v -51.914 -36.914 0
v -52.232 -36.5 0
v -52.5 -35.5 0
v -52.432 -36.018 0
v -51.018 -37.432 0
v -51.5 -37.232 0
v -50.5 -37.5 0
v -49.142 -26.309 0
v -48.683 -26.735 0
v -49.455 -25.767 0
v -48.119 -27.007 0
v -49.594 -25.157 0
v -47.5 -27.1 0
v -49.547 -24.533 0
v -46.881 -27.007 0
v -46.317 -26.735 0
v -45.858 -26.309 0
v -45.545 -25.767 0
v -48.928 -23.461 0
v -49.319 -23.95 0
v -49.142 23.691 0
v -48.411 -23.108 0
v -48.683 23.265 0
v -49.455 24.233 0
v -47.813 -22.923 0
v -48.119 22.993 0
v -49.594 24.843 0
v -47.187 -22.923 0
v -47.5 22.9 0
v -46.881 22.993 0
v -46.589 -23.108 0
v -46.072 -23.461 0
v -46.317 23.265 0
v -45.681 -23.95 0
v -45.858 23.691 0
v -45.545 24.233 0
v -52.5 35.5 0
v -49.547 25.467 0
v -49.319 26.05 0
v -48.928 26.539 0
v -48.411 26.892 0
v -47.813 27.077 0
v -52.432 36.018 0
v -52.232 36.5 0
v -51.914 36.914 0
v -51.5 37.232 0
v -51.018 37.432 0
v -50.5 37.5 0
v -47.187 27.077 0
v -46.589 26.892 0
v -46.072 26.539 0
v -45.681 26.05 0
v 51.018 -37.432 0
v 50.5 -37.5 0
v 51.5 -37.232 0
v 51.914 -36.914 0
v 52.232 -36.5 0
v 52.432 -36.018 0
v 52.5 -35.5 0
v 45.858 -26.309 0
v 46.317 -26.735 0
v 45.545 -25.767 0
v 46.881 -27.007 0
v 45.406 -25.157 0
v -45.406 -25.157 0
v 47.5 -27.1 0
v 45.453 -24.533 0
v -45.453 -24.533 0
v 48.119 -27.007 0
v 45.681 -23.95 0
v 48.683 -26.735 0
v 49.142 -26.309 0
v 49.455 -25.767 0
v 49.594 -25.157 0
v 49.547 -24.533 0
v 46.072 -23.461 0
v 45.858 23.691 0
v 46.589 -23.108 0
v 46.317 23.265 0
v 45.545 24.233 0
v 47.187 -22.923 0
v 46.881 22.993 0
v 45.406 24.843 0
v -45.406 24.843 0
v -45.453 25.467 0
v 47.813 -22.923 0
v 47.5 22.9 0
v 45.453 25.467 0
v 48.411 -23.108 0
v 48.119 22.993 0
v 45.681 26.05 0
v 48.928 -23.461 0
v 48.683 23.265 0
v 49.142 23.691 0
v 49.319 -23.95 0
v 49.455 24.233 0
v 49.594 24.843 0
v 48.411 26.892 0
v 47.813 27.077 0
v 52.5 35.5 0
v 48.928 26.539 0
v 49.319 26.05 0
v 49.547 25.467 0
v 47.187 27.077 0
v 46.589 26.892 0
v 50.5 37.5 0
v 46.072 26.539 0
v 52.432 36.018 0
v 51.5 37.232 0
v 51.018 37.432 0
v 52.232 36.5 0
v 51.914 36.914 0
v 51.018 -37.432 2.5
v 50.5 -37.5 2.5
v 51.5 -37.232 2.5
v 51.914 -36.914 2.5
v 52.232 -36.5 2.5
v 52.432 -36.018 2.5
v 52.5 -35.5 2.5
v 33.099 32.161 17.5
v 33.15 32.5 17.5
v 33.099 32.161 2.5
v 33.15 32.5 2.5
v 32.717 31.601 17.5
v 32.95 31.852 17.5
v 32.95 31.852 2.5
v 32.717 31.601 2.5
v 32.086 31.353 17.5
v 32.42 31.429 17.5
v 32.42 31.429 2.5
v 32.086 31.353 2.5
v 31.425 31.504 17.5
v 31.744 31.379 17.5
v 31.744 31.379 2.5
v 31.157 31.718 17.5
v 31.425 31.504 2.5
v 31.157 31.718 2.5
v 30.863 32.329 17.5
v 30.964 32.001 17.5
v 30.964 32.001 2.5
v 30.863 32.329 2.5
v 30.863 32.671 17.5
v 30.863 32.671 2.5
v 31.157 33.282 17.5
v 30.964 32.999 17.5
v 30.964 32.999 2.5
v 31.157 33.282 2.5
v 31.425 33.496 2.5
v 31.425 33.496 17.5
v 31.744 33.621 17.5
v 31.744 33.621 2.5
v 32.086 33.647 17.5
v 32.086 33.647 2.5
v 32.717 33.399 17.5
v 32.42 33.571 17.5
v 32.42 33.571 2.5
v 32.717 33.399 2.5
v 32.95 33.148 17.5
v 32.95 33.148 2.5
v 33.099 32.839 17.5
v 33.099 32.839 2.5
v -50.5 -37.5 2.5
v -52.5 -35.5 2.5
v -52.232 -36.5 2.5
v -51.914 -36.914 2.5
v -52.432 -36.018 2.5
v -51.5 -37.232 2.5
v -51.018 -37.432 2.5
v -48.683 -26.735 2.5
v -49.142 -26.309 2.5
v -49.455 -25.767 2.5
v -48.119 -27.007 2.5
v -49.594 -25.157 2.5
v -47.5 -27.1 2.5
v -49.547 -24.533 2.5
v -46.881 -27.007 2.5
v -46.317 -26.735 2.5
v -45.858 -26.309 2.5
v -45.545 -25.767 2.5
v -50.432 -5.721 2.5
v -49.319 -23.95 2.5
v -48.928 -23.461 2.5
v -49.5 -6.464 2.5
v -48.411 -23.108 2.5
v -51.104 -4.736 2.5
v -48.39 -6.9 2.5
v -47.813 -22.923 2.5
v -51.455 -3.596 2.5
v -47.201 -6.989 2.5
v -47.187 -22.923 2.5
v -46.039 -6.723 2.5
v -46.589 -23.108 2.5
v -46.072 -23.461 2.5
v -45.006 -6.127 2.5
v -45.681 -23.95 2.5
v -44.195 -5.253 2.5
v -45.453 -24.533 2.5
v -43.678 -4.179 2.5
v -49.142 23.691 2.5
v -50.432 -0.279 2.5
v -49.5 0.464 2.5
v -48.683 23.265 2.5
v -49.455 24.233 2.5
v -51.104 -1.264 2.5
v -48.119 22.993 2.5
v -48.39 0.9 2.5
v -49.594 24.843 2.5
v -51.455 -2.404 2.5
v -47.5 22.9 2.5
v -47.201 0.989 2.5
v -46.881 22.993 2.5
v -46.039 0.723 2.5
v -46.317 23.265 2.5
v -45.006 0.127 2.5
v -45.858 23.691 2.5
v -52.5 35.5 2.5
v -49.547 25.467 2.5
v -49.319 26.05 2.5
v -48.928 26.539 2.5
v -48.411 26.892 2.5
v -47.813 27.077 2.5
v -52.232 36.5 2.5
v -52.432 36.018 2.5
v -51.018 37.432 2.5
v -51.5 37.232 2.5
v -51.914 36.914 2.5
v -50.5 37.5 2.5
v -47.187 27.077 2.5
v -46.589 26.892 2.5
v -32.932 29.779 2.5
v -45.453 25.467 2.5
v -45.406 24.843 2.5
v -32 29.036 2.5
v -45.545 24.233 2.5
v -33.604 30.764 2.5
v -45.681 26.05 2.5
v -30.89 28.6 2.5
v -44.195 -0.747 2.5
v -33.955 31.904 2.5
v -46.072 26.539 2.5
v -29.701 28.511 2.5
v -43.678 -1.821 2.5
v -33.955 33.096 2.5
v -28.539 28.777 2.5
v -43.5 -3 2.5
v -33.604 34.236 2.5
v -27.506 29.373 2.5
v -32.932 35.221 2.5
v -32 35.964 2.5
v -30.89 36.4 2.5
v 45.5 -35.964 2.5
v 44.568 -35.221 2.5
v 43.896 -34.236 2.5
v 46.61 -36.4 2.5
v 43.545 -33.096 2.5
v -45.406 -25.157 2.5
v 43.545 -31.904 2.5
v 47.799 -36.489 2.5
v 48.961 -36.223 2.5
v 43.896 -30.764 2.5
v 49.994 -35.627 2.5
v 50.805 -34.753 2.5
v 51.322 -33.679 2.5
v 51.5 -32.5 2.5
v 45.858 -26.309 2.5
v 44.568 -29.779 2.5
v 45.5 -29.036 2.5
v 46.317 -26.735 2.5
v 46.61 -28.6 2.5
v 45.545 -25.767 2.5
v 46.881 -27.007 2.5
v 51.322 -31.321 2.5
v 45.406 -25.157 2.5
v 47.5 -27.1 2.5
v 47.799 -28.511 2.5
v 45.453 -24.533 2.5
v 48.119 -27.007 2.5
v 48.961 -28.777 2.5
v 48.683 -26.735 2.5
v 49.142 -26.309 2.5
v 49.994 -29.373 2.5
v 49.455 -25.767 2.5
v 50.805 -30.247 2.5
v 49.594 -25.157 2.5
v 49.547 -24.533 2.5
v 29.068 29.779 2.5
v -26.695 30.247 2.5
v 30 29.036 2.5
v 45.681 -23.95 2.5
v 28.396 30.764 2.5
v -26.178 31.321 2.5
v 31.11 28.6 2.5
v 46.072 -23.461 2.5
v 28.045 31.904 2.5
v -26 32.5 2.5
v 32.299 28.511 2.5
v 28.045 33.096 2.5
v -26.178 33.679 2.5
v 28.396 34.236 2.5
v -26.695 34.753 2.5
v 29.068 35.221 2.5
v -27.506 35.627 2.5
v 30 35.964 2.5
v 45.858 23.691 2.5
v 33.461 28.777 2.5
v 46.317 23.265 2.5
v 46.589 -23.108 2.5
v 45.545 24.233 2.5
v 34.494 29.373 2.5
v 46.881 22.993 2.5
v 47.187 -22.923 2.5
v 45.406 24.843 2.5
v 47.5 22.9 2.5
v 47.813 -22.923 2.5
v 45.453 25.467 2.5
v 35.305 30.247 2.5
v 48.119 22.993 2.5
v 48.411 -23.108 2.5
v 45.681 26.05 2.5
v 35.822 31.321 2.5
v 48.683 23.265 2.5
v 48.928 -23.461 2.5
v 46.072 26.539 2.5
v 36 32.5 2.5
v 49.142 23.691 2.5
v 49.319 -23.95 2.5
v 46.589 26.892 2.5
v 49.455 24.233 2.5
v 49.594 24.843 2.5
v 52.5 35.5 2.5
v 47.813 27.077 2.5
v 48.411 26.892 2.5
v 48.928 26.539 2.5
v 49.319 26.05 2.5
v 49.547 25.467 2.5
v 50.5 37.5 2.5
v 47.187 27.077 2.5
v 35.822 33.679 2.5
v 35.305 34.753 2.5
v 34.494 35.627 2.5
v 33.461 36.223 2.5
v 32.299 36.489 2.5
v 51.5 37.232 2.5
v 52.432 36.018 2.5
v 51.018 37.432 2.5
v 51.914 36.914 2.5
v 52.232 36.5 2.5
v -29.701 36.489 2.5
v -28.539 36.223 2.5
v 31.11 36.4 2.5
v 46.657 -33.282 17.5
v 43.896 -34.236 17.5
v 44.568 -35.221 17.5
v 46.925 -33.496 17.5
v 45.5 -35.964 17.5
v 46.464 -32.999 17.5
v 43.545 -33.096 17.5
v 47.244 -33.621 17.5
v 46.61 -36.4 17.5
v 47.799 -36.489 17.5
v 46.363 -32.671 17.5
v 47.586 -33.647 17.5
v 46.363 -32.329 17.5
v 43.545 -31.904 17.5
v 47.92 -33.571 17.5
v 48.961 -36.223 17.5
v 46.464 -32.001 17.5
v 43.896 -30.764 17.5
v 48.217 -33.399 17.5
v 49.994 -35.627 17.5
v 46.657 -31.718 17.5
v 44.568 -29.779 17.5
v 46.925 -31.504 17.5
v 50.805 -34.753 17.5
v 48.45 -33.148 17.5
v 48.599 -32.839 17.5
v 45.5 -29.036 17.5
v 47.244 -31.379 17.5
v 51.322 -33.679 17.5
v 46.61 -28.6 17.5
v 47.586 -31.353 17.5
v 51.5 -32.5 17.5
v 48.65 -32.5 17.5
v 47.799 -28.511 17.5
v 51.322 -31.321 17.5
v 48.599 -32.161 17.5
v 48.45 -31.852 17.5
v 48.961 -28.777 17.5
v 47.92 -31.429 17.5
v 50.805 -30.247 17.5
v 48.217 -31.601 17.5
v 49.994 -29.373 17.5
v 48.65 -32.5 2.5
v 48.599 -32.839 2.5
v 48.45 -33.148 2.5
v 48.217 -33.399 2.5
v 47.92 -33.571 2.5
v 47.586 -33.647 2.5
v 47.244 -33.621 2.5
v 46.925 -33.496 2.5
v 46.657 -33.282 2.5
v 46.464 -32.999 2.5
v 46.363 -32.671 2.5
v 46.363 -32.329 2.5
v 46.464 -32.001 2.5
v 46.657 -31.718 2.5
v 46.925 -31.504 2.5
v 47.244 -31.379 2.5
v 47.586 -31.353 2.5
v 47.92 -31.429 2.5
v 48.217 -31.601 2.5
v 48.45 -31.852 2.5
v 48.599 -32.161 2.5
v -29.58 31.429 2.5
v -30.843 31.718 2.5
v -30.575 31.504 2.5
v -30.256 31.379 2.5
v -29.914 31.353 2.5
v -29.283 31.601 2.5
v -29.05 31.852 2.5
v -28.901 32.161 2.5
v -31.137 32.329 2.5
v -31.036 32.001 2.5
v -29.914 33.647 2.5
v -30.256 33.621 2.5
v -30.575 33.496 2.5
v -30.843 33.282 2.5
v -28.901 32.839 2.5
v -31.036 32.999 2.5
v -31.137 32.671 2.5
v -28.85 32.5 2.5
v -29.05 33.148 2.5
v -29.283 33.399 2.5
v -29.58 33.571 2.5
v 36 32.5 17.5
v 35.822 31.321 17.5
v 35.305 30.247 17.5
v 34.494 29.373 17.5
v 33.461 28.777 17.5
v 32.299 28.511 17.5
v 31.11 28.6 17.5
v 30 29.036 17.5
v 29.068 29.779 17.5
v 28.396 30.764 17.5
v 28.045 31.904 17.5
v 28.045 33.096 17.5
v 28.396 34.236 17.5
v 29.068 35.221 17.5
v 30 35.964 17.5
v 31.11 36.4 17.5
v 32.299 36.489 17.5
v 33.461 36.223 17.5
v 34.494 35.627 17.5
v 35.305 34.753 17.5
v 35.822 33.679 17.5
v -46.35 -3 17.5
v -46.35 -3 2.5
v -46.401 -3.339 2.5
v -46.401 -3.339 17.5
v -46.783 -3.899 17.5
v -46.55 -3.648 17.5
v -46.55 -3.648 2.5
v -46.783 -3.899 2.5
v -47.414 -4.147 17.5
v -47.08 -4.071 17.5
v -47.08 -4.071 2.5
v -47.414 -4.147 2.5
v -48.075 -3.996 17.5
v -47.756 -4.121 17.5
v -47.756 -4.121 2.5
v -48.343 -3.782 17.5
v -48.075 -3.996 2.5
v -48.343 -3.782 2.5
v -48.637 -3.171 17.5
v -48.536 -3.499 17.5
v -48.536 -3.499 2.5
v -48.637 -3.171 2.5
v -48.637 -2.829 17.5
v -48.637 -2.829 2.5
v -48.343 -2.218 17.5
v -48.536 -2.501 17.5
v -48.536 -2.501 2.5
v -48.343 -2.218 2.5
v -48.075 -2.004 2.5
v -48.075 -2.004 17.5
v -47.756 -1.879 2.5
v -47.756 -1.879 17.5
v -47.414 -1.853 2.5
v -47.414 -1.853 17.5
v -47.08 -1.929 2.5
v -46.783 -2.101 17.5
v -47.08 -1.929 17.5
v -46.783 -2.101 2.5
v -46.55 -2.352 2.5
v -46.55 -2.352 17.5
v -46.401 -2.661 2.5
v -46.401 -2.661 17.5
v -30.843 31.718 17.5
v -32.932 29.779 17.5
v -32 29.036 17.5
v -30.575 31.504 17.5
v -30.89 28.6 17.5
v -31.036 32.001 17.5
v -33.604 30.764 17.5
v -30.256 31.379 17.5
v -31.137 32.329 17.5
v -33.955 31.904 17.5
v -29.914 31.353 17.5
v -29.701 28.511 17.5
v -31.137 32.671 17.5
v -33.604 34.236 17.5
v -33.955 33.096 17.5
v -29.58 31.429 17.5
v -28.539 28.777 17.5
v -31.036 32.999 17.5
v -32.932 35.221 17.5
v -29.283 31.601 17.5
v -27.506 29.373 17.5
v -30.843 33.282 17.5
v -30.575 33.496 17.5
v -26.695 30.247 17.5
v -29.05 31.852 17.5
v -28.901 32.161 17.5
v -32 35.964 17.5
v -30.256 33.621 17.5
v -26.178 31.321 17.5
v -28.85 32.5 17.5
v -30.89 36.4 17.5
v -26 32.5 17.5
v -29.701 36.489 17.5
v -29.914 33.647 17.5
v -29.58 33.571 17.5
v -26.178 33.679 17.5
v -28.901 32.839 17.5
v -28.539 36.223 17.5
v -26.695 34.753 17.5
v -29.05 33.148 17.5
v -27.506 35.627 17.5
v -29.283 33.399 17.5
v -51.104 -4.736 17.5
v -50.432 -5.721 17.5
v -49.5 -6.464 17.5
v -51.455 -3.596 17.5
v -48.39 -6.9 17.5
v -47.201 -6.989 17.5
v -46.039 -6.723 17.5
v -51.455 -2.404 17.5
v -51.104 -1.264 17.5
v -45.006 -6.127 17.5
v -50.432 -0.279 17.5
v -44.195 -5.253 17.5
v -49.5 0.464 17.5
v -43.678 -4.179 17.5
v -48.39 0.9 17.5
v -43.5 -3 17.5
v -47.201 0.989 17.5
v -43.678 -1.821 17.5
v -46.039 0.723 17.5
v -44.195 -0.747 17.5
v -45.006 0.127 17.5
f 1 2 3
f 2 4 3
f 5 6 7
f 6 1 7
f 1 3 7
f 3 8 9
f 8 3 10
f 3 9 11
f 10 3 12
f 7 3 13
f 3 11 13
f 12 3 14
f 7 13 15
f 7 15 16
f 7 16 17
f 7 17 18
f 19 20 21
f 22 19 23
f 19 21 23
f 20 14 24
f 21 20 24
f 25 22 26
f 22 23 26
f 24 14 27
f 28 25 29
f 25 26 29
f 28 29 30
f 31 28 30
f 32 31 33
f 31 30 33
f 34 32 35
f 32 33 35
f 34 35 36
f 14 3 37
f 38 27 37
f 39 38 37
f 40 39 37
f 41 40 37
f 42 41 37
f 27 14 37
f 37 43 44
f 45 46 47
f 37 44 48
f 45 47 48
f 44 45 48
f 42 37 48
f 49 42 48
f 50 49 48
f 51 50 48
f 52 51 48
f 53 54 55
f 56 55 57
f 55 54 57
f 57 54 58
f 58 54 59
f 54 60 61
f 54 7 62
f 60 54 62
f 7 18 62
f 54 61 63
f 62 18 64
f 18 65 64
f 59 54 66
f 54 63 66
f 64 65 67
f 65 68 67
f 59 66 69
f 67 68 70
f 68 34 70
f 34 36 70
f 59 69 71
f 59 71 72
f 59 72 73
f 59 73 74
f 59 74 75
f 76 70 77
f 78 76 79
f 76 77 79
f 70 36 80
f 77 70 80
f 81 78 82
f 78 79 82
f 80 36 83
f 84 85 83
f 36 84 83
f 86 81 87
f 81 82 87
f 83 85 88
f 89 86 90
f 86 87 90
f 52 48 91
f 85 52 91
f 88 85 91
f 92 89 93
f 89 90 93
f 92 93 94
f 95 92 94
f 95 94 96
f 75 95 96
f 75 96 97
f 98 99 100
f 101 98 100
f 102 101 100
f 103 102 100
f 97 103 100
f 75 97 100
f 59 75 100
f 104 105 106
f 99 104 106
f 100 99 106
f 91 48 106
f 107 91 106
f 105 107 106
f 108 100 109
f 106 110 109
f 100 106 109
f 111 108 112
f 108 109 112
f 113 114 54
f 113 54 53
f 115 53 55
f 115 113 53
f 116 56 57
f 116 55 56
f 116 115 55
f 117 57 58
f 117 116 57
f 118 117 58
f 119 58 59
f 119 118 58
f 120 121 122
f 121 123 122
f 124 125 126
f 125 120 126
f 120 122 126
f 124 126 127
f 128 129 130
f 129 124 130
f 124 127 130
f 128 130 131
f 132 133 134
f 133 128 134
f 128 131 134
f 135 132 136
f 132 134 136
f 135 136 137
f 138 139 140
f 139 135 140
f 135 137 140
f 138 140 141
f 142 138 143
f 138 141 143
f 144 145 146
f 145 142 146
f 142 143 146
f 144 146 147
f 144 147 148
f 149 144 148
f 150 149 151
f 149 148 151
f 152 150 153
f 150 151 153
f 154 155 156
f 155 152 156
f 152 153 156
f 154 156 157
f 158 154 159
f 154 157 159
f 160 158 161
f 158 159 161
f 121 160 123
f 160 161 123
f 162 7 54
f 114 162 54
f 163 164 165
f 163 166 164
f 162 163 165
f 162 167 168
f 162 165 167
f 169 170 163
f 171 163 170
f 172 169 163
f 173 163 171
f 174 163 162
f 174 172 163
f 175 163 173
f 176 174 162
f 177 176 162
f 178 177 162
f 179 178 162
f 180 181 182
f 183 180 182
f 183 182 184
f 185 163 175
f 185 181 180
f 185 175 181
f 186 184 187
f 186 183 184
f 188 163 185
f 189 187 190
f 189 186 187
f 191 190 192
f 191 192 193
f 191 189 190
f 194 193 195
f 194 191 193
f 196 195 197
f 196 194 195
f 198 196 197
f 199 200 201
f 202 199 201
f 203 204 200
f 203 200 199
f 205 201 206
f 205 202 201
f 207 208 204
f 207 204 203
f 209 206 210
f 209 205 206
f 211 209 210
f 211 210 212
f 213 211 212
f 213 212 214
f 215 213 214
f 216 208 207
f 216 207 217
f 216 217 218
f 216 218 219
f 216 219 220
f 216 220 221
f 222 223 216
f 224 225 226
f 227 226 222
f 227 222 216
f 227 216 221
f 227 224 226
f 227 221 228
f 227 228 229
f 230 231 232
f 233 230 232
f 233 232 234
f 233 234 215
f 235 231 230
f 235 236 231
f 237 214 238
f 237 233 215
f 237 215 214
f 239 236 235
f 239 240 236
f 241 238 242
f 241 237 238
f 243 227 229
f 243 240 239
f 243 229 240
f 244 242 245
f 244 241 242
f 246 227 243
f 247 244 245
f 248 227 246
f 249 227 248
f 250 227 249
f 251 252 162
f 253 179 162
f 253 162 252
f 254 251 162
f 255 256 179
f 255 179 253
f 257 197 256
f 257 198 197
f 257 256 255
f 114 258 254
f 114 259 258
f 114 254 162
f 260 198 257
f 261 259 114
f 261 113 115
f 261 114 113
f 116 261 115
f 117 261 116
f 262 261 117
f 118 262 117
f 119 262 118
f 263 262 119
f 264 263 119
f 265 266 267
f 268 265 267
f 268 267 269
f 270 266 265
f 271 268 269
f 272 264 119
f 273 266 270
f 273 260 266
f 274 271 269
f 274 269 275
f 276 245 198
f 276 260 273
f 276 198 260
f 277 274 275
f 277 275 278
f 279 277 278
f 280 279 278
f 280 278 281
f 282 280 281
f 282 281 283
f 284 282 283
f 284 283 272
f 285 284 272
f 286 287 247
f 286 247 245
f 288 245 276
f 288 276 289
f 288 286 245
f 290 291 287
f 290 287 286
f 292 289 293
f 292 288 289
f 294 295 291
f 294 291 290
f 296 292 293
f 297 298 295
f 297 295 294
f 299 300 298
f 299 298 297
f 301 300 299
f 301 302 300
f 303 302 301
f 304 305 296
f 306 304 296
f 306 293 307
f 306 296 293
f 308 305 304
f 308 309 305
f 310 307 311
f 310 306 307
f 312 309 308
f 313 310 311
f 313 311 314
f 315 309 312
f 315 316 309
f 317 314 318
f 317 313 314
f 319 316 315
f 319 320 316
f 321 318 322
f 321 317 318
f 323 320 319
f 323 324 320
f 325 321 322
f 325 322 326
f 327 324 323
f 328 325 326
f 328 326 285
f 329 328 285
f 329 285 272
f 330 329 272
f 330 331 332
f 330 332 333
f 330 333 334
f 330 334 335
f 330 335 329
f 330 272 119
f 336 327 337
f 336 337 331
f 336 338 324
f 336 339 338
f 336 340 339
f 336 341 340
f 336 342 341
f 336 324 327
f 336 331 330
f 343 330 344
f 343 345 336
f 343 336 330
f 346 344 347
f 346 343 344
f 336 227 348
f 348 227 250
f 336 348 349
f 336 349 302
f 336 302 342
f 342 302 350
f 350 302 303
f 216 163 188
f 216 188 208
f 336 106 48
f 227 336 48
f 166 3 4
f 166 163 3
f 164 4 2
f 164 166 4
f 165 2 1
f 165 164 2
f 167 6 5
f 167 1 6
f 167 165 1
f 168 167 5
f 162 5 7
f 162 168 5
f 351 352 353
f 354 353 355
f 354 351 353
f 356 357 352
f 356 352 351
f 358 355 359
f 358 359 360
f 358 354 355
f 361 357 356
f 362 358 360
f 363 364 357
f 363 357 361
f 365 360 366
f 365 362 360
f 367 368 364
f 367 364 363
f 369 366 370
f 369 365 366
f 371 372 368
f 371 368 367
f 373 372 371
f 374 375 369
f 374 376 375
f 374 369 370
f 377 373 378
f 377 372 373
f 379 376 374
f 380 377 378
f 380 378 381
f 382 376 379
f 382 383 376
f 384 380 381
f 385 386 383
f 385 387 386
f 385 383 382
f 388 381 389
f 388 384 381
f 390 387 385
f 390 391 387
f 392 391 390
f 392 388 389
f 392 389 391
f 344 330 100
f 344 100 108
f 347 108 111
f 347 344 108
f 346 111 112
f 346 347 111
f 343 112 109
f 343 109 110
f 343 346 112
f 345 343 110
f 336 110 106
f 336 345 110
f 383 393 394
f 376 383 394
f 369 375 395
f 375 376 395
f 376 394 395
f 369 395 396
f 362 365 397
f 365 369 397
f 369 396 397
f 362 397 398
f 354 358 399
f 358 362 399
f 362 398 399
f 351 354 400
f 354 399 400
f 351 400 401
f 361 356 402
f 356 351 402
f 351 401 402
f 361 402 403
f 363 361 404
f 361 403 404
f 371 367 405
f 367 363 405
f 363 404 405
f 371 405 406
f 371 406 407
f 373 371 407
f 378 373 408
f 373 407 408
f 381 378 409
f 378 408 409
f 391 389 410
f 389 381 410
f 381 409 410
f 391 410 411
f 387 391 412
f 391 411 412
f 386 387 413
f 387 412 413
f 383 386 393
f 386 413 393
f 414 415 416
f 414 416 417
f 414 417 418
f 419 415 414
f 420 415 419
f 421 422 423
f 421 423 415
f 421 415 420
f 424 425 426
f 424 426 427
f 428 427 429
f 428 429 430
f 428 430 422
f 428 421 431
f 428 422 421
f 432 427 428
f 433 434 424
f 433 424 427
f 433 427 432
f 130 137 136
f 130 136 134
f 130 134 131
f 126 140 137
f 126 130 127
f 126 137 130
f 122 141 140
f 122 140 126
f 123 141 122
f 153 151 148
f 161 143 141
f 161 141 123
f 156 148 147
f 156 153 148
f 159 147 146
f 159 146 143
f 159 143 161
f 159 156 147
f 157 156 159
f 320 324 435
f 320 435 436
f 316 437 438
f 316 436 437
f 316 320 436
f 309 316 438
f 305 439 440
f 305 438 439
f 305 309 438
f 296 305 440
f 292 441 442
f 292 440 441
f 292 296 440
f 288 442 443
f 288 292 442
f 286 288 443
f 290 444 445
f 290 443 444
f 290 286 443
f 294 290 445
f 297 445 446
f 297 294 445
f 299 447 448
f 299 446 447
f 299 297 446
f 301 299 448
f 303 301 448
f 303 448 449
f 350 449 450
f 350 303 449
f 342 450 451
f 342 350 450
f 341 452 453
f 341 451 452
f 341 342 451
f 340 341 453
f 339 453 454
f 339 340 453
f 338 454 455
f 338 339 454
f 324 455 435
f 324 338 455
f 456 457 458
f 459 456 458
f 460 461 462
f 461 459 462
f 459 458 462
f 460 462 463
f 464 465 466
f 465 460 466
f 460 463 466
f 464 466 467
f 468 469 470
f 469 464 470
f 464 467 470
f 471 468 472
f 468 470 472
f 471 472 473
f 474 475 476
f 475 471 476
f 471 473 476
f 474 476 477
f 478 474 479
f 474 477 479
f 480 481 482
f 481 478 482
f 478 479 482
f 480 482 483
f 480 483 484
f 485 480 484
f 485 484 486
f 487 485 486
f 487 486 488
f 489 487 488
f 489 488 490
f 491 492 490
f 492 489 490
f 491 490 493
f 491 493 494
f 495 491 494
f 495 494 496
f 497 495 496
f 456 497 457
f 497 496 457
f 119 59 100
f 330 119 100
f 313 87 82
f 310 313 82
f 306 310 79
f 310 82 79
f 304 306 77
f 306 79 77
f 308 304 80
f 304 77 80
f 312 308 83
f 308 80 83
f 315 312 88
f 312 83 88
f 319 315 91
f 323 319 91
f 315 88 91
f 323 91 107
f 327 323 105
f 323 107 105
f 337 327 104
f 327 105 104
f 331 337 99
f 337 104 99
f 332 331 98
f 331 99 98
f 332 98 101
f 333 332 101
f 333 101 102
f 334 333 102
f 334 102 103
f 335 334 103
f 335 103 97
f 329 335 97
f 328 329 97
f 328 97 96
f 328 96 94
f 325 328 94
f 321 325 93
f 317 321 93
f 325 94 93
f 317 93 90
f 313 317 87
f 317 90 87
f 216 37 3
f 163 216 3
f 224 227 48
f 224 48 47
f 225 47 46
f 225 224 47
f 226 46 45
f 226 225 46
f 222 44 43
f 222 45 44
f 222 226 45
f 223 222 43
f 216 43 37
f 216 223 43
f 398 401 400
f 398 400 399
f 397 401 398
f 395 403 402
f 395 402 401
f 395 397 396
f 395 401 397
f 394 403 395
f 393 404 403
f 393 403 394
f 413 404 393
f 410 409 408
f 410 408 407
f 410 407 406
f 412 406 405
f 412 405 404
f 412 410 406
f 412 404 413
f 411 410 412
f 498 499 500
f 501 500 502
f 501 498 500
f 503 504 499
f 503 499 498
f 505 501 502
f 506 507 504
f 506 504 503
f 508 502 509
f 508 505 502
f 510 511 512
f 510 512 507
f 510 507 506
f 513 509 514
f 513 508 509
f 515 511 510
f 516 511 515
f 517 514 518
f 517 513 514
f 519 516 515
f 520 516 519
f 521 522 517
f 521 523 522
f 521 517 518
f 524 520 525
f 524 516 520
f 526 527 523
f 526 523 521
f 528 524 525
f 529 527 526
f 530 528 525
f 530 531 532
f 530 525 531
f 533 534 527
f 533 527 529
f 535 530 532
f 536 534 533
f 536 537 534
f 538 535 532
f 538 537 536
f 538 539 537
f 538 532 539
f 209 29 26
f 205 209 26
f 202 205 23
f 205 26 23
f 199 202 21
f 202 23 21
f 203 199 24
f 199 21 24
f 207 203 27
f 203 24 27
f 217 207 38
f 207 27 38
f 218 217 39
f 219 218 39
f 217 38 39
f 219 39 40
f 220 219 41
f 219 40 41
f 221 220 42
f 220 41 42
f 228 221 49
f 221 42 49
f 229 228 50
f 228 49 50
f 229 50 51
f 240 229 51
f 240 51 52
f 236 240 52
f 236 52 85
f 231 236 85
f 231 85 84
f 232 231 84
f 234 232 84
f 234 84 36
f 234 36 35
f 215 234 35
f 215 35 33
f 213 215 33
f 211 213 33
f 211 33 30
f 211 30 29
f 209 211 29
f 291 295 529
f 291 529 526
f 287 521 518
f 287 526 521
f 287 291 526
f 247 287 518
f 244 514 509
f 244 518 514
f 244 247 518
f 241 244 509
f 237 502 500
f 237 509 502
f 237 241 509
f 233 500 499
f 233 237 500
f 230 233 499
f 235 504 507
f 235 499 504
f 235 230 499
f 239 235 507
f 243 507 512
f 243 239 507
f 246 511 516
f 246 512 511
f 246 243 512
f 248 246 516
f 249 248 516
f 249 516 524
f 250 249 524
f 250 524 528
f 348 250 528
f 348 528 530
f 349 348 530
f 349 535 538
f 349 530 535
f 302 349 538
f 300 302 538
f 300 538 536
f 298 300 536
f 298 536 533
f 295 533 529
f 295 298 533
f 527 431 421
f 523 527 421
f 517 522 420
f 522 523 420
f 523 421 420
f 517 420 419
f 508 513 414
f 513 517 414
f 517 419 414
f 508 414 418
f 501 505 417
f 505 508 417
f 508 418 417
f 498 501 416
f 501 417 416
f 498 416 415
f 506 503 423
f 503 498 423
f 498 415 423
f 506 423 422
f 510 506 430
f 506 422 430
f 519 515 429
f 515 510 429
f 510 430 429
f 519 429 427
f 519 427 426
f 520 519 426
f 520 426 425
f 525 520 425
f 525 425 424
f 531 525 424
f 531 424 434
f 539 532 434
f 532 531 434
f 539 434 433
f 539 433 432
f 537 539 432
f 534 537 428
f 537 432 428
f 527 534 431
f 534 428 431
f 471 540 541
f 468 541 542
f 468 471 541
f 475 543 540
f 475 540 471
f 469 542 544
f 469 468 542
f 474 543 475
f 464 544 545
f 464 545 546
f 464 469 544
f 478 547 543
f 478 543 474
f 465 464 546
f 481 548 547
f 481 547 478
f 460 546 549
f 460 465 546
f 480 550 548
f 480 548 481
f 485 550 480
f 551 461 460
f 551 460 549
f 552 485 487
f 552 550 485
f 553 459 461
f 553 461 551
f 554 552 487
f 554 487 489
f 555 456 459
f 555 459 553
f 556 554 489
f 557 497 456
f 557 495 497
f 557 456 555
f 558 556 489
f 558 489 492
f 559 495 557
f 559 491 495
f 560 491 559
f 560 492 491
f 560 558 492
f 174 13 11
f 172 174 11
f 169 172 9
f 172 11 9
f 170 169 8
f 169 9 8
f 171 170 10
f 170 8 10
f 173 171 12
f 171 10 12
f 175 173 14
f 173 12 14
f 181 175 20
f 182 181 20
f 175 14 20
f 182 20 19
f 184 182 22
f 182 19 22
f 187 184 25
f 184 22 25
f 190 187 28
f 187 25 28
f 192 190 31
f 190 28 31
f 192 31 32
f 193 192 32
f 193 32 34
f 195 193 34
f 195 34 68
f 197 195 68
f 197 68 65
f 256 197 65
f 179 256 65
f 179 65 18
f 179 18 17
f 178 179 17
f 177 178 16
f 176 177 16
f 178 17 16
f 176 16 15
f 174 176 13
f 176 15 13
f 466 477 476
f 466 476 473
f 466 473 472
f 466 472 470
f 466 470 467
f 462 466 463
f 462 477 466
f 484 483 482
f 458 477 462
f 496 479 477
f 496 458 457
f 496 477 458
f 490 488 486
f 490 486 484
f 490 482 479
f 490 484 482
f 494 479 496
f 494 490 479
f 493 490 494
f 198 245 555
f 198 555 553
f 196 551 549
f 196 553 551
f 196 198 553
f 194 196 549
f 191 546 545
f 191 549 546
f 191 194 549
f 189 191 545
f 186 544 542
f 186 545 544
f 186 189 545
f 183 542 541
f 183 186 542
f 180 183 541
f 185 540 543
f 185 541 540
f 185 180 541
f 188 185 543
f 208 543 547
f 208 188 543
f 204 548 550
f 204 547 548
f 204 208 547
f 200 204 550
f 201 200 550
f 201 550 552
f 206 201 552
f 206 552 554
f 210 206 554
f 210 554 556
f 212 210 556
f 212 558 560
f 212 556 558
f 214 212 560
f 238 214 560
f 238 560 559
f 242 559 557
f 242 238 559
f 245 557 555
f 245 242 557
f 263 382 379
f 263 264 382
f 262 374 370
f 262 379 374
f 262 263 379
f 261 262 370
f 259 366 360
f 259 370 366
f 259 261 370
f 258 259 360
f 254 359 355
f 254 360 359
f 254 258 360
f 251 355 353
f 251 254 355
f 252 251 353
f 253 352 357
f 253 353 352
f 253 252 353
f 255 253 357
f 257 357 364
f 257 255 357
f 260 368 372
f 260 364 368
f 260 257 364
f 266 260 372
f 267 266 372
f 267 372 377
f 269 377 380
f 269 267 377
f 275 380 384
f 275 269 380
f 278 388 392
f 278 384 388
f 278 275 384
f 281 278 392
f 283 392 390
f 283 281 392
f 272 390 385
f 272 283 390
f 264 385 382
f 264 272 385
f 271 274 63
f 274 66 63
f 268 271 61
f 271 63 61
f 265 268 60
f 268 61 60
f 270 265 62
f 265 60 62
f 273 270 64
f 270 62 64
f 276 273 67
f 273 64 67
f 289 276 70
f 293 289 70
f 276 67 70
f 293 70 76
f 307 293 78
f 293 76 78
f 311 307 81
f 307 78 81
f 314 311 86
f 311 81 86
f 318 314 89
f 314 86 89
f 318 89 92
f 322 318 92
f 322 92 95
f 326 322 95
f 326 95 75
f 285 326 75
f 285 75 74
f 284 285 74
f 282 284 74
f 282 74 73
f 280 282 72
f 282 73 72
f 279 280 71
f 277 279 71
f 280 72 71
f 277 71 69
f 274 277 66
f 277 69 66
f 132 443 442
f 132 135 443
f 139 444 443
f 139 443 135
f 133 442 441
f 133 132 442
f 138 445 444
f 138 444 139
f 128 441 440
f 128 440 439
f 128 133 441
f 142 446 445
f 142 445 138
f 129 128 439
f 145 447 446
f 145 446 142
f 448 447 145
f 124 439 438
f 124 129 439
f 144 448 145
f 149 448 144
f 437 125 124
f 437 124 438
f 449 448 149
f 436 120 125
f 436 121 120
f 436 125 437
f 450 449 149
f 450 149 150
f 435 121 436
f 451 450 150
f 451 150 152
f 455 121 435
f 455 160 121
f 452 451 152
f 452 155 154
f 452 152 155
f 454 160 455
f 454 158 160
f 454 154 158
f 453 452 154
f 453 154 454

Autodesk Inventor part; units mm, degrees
ref_plane "YZ Plane" through (0, 0, 0) normal (1, 0, 0) x (0, 1, 0)
ref_plane "XZ Plane" through (0, 0, 0) normal (0, 1, 0) x (-1, 0, 0)
ref_plane "XY Plane" through (0, 0, 0) normal (0, 0, 1) x (1, 0, 0)
sketch "Skizze1" plane through (0, 0, 0) normal (0, 0, 1) x (1, 0, 0)
  line L0 (52.5, 37.5) -> (-52.5, 37.5)
  line L1 (-52.5, 37.5) -> (-52.5, -37.5)
  line L2 (-52.5, -37.5) -> (52.5, -37.5)
  line L3 (52.5, -37.5) -> (52.5, 37.5)
  line L4 (52.5, 37.5) -> (-52.5, -37.5) construction
  line L5 (-52.5, 37.5) -> (52.5, -37.5) construction
  point P0 (0, 0)
  dimension "d0" = 105
  dimension "d1" = 75
extrude "Extrusion1" add sketch "Skizze1" along normal blind 2.5
fillet "Rundung1" radius 2 4 edges at (-52.5, 37.5, 1.25) (52.5, 37.5, 1.25) (52.5, -37.5, 1.25) (-52.5, -37.5, 1.25)
sketch "Skizze2" plane through (0, 0, 2.5) normal (0, 0, 1) x (1, 0, 0)
  arc A0 (-52.5, -35.5) -> (-50.5, -37.5) centre (-50.5, -35.5) ccw construction
  line L0 (-50.5, -37.5) -> (50.5, -37.5) construction
  arc A1 (50.5, -37.5) -> (52.5, -35.5) centre (50.5, -35.5) ccw construction
  line L1 (52.5, -35.5) -> (52.5, 35.5) construction
  arc A2 (52.5, 35.5) -> (50.5, 37.5) centre (50.5, 35.5) ccw construction
  line L2 (50.5, 37.5) -> (-50.5, 37.5) construction
  arc A3 (-50.5, 37.5) -> (-52.5, 35.5) centre (-50.5, 35.5) ccw construction
  line L3 (-52.5, 35.5) -> (-52.5, -35.5) construction
  line L4 (-50, 35) -> (50, 35) construction
  line L5 (50, 35) -> (50, -35) construction
  line L6 (50, -35) -> (-50, -35) construction
  line L7 (-50, -35) -> (-50, 35) construction
  line L8 (-50, 35) -> (50, -35) construction
  line L9 (50, 35) -> (-50, -35) construction
  line L10 (-50, 35) -> (-47.5, 35) construction
  line L11 (-50, 35) -> (-50, 32.5) construction
  line L12 (50, 35) -> (47.5, 35) construction
  line L13 (50, 35) -> (50, 32.5) construction
  line L14 (-50, -35) -> (-50, -32.5) construction
  line L15 (-47.5, 35) -> (-47.5, -3) construction
  line L16 (-50, 32.5) -> (-30, 32.5) construction
  line L17 (50, 32.5) -> (32, 32.5) construction
  line L18 (50, -35) -> (47.5, -35) construction
  line L19 (47.5, -35) -> (47.5, -32.5) construction
  circle A4 centre (-30, 32.5) radius 4
  circle A5 centre (32, 32.5) radius 4
  circle A6 centre (47.5, -32.5) radius 4
  circle A7 centre (-47.5, -3) radius 4
  circle A8 centre (-30, 32.5) radius 1.15
  circle A9 centre (32, 32.5) radius 1.15
  circle A10 centre (47.5, -32.5) radius 1.15
  circle A11 centre (-47.5, -3) radius 1.15
  point P0 (0, 0)
  dimension "d5" = 100
  dimension "d6" = 70
  dimension "d7" = 2.5
  dimension "d8" = 2.5
  dimension "d9" = 2.5
  dimension "d10" = 2.5
  dimension "d11" = 2.5
  dimension "d12" = 38
  dimension "d13" = 20
  dimension "d14" = 18
  dimension "d15" = 2.5
  dimension "d16" = 2.5
  dimension "d17" = 8
  dimension "d18" = 8
  dimension "d19" = 8
  dimension "d20" = 8
  dimension "d23" = 2.3
  dimension "d24" = 2.3
  dimension "d25" = 2.3
  dimension "d26" = 2.3
extrude "Extrusion3" add sketch "Skizze2" along normal blind 15
sketch "Skizze3" plane through (0, 0, 2.5) normal (0, 0, 1) x (1, 0, 0)
  circle A0 centre (47.5, -32.5) radius 4 construction
  circle A1 centre (-30, 32.5) radius 4 construction
  circle A2 centre (32, 32.5) radius 4 construction
  circle A3 centre (-47.5, -3) radius 4 construction
  arc A4 (-52.5, -35.5) -> (-50.5, -37.5) centre (-50.5, -35.5) ccw construction
  line L0 (-50.5, -37.5) -> (50.5, -37.5) construction
  arc A5 (50.5, -37.5) -> (52.5, -35.5) centre (50.5, -35.5) ccw construction
  line L1 (52.5, -35.5) -> (52.5, 35.5) construction
  arc A6 (52.5, 35.5) -> (50.5, 37.5) centre (50.5, 35.5) ccw construction
  line L2 (50.5, 37.5) -> (-50.5, 37.5) construction
  arc A7 (-50.5, 37.5) -> (-52.5, 35.5) centre (-50.5, 35.5) ccw construction
  line L3 (-52.5, 35.5) -> (-52.5, -35.5) construction
  line L4 (-47.5, 25) -> (47.5, 25) construction
  line L5 (47.5, 25) -> (47.5, -25) construction
  line L6 (47.5, -25) -> (-47.5, -25) construction
  line L7 (-47.5, -25) -> (-47.5, 25) construction
  line L8 (-47.5, 25) -> (47.5, -25) construction
  line L9 (47.5, 25) -> (-47.5, -25) construction
  point P0 (0, 0)
  dimension "d29" = 50
hole "Bohrung1" at (-47.5, 25, 2.5) at (47.5, 25, 2.5) at (47.5, -25, 2.5) at (-47.5, -25, 2.5) direction (0, 0, -1) diameter 4.2 end through all
properties part number "PCB_Case_Btm"
